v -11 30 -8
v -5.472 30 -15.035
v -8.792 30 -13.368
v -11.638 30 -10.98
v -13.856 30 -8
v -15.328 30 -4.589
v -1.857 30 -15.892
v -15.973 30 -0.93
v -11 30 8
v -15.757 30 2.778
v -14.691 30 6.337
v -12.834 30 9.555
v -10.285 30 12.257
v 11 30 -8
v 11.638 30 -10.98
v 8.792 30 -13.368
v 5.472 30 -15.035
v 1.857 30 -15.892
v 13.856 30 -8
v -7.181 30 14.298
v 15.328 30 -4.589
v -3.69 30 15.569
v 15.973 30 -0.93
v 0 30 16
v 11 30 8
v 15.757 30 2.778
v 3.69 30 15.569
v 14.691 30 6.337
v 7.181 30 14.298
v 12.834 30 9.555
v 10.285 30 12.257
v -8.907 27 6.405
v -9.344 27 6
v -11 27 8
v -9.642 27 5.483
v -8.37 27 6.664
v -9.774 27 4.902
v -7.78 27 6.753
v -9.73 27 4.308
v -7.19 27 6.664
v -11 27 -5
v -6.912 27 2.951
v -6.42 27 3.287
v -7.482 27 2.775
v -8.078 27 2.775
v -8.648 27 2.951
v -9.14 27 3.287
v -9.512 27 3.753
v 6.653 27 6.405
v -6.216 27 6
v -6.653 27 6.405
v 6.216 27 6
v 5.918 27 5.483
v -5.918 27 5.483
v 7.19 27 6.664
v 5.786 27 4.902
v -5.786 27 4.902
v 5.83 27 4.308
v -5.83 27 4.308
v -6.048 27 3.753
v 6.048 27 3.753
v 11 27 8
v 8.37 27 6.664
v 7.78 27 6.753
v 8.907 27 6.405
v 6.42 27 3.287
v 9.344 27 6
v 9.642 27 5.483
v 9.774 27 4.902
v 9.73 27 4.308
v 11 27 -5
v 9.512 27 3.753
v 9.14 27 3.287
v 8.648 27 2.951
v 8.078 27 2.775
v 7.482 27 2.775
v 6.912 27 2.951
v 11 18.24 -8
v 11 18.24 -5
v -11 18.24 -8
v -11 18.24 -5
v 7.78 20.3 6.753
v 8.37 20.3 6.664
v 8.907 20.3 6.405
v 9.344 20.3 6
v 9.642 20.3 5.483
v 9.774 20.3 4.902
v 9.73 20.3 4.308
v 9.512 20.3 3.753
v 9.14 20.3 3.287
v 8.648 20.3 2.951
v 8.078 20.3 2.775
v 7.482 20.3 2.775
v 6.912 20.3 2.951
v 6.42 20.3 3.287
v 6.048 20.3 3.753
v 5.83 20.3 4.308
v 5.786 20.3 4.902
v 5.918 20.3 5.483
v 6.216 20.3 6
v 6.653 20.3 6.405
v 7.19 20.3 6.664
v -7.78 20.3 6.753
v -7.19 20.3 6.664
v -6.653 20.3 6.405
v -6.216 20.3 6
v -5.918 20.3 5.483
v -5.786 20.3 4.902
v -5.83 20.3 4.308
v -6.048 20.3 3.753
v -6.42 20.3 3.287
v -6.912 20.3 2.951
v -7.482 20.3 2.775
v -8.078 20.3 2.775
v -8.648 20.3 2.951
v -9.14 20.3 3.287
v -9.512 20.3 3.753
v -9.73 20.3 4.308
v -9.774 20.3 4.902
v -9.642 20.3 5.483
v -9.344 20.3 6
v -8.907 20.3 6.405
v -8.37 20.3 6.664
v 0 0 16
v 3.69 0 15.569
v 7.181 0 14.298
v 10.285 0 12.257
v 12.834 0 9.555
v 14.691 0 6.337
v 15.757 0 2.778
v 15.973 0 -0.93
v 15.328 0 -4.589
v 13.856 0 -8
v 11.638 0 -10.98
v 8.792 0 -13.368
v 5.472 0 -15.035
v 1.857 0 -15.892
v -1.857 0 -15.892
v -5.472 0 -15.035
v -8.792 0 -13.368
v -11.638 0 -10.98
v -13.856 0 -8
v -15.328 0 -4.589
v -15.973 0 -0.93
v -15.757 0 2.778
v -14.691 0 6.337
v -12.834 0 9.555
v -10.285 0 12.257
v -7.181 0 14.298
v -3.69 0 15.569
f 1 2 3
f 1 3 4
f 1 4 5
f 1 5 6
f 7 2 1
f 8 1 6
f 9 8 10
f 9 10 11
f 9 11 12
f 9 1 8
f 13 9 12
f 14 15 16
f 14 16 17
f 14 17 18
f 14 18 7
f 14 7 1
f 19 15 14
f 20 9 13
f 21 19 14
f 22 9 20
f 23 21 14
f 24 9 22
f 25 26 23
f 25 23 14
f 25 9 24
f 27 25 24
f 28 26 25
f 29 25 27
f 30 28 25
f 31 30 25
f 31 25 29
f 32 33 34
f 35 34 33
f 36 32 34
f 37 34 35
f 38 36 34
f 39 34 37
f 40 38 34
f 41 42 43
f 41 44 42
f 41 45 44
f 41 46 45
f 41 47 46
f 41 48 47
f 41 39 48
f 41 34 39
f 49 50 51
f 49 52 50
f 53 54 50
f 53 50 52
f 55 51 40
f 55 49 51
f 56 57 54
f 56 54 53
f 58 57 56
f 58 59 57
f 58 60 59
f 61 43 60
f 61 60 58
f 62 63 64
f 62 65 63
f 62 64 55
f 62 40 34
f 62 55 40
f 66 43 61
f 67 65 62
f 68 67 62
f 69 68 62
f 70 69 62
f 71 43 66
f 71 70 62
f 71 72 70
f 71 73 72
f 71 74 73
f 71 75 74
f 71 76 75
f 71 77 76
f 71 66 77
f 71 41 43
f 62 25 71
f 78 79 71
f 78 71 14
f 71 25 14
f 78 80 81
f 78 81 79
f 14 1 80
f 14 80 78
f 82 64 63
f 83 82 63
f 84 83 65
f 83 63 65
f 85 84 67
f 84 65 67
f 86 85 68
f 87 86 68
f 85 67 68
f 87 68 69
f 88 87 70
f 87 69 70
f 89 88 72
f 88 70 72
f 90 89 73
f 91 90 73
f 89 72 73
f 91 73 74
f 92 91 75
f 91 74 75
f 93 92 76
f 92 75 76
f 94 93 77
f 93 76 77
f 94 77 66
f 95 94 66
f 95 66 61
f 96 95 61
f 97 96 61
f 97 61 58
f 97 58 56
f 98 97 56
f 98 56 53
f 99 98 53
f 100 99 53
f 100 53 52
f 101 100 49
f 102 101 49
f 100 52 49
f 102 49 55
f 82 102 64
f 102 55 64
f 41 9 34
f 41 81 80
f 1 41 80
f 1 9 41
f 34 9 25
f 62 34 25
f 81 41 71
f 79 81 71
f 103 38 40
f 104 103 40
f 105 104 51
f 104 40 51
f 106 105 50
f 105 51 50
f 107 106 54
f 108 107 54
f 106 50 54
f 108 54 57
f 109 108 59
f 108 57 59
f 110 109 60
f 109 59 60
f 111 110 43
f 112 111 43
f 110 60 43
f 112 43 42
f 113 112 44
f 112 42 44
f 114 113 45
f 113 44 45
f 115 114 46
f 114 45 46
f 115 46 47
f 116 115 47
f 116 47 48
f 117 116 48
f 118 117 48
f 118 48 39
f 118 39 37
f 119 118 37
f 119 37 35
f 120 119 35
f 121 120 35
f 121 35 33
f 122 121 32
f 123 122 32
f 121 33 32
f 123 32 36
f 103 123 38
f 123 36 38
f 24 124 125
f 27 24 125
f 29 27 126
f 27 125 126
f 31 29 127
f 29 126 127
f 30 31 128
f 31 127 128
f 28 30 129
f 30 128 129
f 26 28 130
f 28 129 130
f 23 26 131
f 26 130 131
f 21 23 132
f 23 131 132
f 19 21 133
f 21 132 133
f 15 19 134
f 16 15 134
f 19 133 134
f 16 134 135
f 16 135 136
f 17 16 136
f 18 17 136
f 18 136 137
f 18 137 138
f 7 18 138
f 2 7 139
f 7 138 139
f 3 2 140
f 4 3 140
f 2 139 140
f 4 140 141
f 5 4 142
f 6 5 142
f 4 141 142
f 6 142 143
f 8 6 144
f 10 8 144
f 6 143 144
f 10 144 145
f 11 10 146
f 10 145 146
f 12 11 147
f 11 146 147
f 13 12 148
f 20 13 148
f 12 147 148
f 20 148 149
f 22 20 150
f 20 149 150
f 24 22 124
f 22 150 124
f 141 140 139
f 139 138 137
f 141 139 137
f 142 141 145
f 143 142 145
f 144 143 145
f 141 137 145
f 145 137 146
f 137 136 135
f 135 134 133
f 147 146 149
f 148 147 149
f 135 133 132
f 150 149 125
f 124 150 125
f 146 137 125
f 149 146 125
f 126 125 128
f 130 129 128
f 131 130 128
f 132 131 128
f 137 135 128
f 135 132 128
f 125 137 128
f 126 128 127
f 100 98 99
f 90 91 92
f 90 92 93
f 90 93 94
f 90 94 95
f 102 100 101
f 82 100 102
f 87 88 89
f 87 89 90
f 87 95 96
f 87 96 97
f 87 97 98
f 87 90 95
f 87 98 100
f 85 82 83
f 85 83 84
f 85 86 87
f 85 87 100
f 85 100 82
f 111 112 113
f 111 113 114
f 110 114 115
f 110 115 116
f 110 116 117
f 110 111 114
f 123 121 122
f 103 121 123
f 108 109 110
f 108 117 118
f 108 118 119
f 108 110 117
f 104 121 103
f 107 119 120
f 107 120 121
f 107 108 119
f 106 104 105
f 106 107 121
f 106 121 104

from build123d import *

# Parameters (mm, degrees)
SKETCH1_R           = 16
BOSS_EXTRUDE1_DEPTH = 30
SKETCH2_W           = 22
SKETCH2_H           = 16
CUT_EXTRUDE1_DEPTH  = 3
SKETCH3_R           = 2
CUT_EXTRUDE2_DEPTH  = 6.7
SKETCH4_W           = 22
SKETCH4_H           = 3
CUT_EXTRUDE3_DEPTH  = 8.76


with BuildPart() as part:
    # Sketch1 → Boss-Extrude1 (new body)
    with BuildSketch(Plane(origin=(0, 0, 0), x_dir=(1, 0, 0), z_dir=(0, 1, 0))):
        with Locations(Location((0, 0, 0), (0, 0, 270))):
            Circle(SKETCH1_R)
    extrude(amount=BOSS_EXTRUDE1_DEPTH)

    # Sketch2 → Cut-Extrude1 (cut)
    with BuildSketch(Plane(origin=(0, 30, 0), x_dir=(1, 0, 0), z_dir=(0, 1, 0))):
        Rectangle(SKETCH2_W, SKETCH2_H)
    extrude(amount=-CUT_EXTRUDE1_DEPTH, mode=Mode.SUBTRACT)

    # Sketch3 → Cut-Extrude2 (cut)
    with BuildSketch(Plane(origin=(0, 27, 0), x_dir=(1, 0, 0), z_dir=(0, 1, 0))):
        with Locations(Location((-7.78, -4.752687539, 0), (0, 0, 270))):
            Circle(SKETCH3_R)
        with Locations(Location((7.78, -4.752687539, 0), (0, 0, 270))):
            Circle(SKETCH3_R)
    extrude(amount=-CUT_EXTRUDE2_DEPTH, mode=Mode.SUBTRACT)

    # Sketch4 → Cut-Extrude3 (cut)
    with BuildSketch(Plane(origin=(0, 27, 0), x_dir=(1, 0, 0), z_dir=(0, 1, 0))):
        with Locations((0, 6.5)):
            Rectangle(SKETCH4_W, SKETCH4_H)
    extrude(amount=-CUT_EXTRUDE3_DEPTH, mode=Mode.SUBTRACT)


solid = part.part
